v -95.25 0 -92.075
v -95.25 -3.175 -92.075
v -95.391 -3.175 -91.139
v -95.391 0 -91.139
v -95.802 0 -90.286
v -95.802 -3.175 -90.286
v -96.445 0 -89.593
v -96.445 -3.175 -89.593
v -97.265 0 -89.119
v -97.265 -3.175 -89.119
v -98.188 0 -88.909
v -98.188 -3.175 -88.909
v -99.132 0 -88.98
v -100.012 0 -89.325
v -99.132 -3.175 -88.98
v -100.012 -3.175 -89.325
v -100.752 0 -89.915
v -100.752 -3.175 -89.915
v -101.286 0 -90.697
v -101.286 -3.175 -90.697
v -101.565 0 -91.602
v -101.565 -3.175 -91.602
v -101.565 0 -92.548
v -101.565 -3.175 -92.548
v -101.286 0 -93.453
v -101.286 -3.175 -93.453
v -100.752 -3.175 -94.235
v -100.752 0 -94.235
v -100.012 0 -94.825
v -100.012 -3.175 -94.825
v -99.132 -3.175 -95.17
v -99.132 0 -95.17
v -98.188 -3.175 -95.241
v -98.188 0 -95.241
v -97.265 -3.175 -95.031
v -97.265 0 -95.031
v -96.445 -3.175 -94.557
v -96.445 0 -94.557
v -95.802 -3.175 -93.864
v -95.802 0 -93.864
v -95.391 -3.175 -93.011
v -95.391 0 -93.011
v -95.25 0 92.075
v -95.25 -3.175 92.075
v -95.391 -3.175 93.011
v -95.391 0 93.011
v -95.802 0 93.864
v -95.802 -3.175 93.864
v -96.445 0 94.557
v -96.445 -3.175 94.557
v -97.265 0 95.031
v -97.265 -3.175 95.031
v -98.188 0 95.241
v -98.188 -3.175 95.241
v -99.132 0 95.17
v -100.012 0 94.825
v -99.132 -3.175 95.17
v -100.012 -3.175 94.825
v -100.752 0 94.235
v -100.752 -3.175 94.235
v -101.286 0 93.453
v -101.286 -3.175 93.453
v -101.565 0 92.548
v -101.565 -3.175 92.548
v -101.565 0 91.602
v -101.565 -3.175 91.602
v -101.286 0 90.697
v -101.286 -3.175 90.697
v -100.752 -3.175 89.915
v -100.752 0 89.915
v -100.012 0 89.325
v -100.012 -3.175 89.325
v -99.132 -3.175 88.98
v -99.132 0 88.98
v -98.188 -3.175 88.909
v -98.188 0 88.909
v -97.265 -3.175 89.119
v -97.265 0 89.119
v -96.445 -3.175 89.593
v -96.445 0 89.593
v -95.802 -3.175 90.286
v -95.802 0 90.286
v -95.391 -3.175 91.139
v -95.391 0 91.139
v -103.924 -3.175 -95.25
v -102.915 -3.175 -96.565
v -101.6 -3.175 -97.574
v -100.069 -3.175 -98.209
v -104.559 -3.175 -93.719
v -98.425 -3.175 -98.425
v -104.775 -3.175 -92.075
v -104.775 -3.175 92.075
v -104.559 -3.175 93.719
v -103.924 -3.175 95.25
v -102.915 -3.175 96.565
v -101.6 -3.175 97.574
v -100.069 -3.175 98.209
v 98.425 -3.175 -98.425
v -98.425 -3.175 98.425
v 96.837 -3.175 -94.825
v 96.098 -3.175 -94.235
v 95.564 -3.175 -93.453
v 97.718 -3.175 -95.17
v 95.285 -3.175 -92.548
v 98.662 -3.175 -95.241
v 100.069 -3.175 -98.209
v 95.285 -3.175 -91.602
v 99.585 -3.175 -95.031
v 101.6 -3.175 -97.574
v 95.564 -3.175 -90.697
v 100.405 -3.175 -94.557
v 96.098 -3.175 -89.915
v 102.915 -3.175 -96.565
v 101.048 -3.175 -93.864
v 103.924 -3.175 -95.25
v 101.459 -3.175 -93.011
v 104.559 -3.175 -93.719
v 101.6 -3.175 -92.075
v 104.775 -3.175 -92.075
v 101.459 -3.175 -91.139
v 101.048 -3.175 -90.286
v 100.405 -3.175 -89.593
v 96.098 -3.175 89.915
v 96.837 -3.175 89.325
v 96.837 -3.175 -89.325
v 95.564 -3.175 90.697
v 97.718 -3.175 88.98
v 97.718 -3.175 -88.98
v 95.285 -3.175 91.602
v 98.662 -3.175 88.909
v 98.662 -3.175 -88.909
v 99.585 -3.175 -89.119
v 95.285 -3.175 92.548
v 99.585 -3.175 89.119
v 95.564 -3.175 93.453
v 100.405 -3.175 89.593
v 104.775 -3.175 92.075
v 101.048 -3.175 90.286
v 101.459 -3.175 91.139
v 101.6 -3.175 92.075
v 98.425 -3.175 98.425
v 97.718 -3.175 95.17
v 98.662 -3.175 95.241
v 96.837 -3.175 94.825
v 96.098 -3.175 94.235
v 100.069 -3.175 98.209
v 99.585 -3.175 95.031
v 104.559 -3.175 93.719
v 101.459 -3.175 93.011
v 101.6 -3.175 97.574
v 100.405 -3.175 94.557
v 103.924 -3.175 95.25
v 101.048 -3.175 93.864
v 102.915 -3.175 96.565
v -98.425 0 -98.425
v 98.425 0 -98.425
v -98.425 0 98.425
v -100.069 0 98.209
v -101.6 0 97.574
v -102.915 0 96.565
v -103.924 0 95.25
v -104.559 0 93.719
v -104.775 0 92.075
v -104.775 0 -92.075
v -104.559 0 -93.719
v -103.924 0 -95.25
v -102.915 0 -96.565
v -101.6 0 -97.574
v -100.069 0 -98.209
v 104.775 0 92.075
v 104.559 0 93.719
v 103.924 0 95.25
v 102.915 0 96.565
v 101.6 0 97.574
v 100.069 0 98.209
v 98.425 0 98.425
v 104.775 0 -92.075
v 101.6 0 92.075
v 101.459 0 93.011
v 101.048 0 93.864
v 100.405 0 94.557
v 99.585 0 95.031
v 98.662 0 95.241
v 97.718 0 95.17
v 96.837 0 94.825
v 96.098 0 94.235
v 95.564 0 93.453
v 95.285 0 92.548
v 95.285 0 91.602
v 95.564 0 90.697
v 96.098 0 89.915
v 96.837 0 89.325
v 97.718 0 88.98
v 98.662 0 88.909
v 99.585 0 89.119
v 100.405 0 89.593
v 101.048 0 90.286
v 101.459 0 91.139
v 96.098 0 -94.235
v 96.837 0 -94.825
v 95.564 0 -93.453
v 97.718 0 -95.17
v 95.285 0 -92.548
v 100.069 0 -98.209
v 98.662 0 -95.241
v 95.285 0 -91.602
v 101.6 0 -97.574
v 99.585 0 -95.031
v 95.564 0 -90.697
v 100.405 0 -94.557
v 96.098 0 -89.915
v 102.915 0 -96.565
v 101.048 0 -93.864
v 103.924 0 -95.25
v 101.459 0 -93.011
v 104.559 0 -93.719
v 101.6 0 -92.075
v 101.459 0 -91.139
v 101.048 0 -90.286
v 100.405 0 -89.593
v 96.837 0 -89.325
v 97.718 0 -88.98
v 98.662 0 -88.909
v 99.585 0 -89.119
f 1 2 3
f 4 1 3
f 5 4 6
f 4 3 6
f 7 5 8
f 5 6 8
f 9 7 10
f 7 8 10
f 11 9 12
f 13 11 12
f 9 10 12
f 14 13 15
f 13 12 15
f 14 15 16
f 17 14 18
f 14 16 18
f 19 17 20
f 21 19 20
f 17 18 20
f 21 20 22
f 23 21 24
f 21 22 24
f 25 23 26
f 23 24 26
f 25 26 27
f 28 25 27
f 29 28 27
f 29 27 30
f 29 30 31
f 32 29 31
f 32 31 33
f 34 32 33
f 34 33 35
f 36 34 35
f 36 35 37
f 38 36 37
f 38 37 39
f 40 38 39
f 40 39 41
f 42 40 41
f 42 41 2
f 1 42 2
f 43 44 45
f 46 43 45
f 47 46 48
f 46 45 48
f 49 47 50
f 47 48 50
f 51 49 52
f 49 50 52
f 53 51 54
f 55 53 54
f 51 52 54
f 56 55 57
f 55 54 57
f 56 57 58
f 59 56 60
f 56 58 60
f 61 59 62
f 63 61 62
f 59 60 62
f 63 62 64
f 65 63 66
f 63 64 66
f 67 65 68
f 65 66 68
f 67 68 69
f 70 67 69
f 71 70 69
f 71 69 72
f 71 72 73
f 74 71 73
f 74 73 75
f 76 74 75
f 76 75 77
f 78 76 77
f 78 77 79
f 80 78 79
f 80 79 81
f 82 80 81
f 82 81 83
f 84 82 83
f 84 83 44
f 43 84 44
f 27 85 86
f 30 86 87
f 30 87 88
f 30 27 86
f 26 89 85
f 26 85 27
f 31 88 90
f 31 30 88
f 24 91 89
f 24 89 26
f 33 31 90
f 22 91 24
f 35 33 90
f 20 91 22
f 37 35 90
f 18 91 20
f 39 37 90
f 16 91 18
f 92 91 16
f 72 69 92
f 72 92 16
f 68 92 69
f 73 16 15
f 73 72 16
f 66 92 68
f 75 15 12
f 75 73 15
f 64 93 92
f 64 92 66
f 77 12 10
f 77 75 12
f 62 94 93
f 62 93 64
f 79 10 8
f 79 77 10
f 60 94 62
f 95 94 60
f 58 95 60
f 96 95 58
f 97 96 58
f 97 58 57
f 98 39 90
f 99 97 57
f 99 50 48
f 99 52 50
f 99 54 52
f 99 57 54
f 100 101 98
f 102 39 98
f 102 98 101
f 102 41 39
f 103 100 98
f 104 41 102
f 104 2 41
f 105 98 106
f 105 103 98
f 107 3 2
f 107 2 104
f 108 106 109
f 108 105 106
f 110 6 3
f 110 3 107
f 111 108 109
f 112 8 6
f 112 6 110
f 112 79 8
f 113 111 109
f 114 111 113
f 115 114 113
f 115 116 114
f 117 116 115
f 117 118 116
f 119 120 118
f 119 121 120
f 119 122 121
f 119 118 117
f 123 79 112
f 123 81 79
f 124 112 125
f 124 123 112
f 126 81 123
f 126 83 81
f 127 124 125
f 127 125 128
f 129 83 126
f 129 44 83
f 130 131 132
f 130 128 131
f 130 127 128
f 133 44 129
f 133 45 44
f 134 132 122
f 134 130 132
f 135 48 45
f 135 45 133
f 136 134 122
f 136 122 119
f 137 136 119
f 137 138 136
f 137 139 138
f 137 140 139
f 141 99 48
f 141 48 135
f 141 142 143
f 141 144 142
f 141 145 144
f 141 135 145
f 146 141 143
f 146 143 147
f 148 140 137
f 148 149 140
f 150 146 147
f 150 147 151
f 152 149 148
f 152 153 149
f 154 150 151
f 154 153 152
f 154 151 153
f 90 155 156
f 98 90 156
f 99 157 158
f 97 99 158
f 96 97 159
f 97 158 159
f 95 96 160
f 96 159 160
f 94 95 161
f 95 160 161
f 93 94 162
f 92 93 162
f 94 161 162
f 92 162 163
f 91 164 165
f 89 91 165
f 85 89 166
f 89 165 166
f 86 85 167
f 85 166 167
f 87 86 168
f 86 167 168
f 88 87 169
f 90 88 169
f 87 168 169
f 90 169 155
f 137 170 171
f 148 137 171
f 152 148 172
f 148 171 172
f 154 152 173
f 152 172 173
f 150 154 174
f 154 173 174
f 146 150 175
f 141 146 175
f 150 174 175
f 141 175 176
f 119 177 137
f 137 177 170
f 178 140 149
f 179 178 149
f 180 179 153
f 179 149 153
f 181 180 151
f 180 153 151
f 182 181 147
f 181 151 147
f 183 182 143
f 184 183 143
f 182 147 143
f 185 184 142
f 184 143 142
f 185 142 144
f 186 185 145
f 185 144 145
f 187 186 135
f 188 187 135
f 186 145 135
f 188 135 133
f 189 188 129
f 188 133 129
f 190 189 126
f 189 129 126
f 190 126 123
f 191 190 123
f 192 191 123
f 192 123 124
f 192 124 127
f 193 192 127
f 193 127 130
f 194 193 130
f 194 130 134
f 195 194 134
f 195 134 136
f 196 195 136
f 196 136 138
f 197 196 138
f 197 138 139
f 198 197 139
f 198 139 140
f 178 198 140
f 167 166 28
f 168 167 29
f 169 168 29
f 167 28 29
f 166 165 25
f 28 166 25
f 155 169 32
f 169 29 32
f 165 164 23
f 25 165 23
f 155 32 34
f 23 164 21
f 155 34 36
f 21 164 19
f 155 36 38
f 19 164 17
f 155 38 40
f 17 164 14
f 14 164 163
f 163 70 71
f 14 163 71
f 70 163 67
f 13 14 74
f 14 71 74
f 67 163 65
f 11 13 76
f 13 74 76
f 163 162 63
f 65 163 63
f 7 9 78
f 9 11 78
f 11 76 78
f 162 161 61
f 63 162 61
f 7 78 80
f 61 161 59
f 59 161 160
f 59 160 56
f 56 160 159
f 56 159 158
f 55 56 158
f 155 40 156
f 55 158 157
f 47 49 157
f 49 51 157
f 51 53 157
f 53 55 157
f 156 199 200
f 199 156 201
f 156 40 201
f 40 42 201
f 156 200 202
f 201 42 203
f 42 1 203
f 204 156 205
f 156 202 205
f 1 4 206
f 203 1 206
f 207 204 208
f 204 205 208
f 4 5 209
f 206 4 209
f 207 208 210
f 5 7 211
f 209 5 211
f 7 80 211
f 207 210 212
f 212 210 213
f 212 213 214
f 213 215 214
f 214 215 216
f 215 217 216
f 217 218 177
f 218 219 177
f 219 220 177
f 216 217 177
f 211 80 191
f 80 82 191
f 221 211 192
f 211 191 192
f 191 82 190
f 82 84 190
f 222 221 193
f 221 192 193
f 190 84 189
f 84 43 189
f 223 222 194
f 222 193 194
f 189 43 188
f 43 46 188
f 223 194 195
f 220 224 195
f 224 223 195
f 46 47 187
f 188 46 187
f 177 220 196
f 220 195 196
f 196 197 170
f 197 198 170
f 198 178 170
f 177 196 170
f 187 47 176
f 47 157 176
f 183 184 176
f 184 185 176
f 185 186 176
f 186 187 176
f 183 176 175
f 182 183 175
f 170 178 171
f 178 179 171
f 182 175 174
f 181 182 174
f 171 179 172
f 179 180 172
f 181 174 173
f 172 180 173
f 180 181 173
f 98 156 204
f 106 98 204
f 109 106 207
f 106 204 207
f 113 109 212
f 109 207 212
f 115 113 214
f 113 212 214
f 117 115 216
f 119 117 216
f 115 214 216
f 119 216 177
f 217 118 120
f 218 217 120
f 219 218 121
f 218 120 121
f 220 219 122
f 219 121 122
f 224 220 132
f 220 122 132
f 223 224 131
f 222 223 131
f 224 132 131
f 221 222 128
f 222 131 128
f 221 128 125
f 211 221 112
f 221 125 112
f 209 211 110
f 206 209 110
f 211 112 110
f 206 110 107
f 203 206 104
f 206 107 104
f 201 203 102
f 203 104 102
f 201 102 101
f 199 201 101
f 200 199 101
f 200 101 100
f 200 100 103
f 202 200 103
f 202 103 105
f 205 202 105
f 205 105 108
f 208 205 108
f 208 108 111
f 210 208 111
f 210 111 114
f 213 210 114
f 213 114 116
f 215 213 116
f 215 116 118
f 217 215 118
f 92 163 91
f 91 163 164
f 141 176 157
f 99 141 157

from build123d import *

# Parameters (mm, degrees)
F1_DEPTH = 3.175
F2_R     = 3.175
F3_DEPTH = 25.4


with BuildPart() as f1:
    # F0 (on Front) → F1 (new body)
    with BuildSketch(Plane.XZ):
        with BuildLine():
            Line((98.425, 98.425), (-98.425, 98.425))
            ThreePointArc((-98.425, 98.425), (-102.915128, 96.565128), (-104.775, 92.075))
            Line((-104.775, 92.075), (-104.775, -92.075))
            ThreePointArc((-104.775, -92.075), (-102.915128, -96.565128), (-98.425, -98.425))
            Line((-98.425, -98.425), (98.425, -98.425))
            ThreePointArc((98.425, -98.425), (102.915128, -96.565128), (104.775, -92.075))
            Line((104.775, -92.075), (104.775, 92.075))
            ThreePointArc((104.775, 92.075), (102.915128, 96.565128), (98.425, 98.425))
        make_face()
    extrude(amount=F1_DEPTH)

    # F2 (on face) → F3 (cut)
    with BuildSketch(Plane.XZ.offset(3.175)):
        with Locations((-98.425, 92.075)):
            Circle(F2_R)
        with Locations((98.425, 92.075)):
            Circle(F2_R)
        with Locations((98.425, -92.075)):
            Circle(F2_R)
        with Locations((-98.425, -92.075)):
            Circle(F2_R)
    extrude(amount=-F3_DEPTH, mode=Mode.SUBTRACT)


solid = f1.part
